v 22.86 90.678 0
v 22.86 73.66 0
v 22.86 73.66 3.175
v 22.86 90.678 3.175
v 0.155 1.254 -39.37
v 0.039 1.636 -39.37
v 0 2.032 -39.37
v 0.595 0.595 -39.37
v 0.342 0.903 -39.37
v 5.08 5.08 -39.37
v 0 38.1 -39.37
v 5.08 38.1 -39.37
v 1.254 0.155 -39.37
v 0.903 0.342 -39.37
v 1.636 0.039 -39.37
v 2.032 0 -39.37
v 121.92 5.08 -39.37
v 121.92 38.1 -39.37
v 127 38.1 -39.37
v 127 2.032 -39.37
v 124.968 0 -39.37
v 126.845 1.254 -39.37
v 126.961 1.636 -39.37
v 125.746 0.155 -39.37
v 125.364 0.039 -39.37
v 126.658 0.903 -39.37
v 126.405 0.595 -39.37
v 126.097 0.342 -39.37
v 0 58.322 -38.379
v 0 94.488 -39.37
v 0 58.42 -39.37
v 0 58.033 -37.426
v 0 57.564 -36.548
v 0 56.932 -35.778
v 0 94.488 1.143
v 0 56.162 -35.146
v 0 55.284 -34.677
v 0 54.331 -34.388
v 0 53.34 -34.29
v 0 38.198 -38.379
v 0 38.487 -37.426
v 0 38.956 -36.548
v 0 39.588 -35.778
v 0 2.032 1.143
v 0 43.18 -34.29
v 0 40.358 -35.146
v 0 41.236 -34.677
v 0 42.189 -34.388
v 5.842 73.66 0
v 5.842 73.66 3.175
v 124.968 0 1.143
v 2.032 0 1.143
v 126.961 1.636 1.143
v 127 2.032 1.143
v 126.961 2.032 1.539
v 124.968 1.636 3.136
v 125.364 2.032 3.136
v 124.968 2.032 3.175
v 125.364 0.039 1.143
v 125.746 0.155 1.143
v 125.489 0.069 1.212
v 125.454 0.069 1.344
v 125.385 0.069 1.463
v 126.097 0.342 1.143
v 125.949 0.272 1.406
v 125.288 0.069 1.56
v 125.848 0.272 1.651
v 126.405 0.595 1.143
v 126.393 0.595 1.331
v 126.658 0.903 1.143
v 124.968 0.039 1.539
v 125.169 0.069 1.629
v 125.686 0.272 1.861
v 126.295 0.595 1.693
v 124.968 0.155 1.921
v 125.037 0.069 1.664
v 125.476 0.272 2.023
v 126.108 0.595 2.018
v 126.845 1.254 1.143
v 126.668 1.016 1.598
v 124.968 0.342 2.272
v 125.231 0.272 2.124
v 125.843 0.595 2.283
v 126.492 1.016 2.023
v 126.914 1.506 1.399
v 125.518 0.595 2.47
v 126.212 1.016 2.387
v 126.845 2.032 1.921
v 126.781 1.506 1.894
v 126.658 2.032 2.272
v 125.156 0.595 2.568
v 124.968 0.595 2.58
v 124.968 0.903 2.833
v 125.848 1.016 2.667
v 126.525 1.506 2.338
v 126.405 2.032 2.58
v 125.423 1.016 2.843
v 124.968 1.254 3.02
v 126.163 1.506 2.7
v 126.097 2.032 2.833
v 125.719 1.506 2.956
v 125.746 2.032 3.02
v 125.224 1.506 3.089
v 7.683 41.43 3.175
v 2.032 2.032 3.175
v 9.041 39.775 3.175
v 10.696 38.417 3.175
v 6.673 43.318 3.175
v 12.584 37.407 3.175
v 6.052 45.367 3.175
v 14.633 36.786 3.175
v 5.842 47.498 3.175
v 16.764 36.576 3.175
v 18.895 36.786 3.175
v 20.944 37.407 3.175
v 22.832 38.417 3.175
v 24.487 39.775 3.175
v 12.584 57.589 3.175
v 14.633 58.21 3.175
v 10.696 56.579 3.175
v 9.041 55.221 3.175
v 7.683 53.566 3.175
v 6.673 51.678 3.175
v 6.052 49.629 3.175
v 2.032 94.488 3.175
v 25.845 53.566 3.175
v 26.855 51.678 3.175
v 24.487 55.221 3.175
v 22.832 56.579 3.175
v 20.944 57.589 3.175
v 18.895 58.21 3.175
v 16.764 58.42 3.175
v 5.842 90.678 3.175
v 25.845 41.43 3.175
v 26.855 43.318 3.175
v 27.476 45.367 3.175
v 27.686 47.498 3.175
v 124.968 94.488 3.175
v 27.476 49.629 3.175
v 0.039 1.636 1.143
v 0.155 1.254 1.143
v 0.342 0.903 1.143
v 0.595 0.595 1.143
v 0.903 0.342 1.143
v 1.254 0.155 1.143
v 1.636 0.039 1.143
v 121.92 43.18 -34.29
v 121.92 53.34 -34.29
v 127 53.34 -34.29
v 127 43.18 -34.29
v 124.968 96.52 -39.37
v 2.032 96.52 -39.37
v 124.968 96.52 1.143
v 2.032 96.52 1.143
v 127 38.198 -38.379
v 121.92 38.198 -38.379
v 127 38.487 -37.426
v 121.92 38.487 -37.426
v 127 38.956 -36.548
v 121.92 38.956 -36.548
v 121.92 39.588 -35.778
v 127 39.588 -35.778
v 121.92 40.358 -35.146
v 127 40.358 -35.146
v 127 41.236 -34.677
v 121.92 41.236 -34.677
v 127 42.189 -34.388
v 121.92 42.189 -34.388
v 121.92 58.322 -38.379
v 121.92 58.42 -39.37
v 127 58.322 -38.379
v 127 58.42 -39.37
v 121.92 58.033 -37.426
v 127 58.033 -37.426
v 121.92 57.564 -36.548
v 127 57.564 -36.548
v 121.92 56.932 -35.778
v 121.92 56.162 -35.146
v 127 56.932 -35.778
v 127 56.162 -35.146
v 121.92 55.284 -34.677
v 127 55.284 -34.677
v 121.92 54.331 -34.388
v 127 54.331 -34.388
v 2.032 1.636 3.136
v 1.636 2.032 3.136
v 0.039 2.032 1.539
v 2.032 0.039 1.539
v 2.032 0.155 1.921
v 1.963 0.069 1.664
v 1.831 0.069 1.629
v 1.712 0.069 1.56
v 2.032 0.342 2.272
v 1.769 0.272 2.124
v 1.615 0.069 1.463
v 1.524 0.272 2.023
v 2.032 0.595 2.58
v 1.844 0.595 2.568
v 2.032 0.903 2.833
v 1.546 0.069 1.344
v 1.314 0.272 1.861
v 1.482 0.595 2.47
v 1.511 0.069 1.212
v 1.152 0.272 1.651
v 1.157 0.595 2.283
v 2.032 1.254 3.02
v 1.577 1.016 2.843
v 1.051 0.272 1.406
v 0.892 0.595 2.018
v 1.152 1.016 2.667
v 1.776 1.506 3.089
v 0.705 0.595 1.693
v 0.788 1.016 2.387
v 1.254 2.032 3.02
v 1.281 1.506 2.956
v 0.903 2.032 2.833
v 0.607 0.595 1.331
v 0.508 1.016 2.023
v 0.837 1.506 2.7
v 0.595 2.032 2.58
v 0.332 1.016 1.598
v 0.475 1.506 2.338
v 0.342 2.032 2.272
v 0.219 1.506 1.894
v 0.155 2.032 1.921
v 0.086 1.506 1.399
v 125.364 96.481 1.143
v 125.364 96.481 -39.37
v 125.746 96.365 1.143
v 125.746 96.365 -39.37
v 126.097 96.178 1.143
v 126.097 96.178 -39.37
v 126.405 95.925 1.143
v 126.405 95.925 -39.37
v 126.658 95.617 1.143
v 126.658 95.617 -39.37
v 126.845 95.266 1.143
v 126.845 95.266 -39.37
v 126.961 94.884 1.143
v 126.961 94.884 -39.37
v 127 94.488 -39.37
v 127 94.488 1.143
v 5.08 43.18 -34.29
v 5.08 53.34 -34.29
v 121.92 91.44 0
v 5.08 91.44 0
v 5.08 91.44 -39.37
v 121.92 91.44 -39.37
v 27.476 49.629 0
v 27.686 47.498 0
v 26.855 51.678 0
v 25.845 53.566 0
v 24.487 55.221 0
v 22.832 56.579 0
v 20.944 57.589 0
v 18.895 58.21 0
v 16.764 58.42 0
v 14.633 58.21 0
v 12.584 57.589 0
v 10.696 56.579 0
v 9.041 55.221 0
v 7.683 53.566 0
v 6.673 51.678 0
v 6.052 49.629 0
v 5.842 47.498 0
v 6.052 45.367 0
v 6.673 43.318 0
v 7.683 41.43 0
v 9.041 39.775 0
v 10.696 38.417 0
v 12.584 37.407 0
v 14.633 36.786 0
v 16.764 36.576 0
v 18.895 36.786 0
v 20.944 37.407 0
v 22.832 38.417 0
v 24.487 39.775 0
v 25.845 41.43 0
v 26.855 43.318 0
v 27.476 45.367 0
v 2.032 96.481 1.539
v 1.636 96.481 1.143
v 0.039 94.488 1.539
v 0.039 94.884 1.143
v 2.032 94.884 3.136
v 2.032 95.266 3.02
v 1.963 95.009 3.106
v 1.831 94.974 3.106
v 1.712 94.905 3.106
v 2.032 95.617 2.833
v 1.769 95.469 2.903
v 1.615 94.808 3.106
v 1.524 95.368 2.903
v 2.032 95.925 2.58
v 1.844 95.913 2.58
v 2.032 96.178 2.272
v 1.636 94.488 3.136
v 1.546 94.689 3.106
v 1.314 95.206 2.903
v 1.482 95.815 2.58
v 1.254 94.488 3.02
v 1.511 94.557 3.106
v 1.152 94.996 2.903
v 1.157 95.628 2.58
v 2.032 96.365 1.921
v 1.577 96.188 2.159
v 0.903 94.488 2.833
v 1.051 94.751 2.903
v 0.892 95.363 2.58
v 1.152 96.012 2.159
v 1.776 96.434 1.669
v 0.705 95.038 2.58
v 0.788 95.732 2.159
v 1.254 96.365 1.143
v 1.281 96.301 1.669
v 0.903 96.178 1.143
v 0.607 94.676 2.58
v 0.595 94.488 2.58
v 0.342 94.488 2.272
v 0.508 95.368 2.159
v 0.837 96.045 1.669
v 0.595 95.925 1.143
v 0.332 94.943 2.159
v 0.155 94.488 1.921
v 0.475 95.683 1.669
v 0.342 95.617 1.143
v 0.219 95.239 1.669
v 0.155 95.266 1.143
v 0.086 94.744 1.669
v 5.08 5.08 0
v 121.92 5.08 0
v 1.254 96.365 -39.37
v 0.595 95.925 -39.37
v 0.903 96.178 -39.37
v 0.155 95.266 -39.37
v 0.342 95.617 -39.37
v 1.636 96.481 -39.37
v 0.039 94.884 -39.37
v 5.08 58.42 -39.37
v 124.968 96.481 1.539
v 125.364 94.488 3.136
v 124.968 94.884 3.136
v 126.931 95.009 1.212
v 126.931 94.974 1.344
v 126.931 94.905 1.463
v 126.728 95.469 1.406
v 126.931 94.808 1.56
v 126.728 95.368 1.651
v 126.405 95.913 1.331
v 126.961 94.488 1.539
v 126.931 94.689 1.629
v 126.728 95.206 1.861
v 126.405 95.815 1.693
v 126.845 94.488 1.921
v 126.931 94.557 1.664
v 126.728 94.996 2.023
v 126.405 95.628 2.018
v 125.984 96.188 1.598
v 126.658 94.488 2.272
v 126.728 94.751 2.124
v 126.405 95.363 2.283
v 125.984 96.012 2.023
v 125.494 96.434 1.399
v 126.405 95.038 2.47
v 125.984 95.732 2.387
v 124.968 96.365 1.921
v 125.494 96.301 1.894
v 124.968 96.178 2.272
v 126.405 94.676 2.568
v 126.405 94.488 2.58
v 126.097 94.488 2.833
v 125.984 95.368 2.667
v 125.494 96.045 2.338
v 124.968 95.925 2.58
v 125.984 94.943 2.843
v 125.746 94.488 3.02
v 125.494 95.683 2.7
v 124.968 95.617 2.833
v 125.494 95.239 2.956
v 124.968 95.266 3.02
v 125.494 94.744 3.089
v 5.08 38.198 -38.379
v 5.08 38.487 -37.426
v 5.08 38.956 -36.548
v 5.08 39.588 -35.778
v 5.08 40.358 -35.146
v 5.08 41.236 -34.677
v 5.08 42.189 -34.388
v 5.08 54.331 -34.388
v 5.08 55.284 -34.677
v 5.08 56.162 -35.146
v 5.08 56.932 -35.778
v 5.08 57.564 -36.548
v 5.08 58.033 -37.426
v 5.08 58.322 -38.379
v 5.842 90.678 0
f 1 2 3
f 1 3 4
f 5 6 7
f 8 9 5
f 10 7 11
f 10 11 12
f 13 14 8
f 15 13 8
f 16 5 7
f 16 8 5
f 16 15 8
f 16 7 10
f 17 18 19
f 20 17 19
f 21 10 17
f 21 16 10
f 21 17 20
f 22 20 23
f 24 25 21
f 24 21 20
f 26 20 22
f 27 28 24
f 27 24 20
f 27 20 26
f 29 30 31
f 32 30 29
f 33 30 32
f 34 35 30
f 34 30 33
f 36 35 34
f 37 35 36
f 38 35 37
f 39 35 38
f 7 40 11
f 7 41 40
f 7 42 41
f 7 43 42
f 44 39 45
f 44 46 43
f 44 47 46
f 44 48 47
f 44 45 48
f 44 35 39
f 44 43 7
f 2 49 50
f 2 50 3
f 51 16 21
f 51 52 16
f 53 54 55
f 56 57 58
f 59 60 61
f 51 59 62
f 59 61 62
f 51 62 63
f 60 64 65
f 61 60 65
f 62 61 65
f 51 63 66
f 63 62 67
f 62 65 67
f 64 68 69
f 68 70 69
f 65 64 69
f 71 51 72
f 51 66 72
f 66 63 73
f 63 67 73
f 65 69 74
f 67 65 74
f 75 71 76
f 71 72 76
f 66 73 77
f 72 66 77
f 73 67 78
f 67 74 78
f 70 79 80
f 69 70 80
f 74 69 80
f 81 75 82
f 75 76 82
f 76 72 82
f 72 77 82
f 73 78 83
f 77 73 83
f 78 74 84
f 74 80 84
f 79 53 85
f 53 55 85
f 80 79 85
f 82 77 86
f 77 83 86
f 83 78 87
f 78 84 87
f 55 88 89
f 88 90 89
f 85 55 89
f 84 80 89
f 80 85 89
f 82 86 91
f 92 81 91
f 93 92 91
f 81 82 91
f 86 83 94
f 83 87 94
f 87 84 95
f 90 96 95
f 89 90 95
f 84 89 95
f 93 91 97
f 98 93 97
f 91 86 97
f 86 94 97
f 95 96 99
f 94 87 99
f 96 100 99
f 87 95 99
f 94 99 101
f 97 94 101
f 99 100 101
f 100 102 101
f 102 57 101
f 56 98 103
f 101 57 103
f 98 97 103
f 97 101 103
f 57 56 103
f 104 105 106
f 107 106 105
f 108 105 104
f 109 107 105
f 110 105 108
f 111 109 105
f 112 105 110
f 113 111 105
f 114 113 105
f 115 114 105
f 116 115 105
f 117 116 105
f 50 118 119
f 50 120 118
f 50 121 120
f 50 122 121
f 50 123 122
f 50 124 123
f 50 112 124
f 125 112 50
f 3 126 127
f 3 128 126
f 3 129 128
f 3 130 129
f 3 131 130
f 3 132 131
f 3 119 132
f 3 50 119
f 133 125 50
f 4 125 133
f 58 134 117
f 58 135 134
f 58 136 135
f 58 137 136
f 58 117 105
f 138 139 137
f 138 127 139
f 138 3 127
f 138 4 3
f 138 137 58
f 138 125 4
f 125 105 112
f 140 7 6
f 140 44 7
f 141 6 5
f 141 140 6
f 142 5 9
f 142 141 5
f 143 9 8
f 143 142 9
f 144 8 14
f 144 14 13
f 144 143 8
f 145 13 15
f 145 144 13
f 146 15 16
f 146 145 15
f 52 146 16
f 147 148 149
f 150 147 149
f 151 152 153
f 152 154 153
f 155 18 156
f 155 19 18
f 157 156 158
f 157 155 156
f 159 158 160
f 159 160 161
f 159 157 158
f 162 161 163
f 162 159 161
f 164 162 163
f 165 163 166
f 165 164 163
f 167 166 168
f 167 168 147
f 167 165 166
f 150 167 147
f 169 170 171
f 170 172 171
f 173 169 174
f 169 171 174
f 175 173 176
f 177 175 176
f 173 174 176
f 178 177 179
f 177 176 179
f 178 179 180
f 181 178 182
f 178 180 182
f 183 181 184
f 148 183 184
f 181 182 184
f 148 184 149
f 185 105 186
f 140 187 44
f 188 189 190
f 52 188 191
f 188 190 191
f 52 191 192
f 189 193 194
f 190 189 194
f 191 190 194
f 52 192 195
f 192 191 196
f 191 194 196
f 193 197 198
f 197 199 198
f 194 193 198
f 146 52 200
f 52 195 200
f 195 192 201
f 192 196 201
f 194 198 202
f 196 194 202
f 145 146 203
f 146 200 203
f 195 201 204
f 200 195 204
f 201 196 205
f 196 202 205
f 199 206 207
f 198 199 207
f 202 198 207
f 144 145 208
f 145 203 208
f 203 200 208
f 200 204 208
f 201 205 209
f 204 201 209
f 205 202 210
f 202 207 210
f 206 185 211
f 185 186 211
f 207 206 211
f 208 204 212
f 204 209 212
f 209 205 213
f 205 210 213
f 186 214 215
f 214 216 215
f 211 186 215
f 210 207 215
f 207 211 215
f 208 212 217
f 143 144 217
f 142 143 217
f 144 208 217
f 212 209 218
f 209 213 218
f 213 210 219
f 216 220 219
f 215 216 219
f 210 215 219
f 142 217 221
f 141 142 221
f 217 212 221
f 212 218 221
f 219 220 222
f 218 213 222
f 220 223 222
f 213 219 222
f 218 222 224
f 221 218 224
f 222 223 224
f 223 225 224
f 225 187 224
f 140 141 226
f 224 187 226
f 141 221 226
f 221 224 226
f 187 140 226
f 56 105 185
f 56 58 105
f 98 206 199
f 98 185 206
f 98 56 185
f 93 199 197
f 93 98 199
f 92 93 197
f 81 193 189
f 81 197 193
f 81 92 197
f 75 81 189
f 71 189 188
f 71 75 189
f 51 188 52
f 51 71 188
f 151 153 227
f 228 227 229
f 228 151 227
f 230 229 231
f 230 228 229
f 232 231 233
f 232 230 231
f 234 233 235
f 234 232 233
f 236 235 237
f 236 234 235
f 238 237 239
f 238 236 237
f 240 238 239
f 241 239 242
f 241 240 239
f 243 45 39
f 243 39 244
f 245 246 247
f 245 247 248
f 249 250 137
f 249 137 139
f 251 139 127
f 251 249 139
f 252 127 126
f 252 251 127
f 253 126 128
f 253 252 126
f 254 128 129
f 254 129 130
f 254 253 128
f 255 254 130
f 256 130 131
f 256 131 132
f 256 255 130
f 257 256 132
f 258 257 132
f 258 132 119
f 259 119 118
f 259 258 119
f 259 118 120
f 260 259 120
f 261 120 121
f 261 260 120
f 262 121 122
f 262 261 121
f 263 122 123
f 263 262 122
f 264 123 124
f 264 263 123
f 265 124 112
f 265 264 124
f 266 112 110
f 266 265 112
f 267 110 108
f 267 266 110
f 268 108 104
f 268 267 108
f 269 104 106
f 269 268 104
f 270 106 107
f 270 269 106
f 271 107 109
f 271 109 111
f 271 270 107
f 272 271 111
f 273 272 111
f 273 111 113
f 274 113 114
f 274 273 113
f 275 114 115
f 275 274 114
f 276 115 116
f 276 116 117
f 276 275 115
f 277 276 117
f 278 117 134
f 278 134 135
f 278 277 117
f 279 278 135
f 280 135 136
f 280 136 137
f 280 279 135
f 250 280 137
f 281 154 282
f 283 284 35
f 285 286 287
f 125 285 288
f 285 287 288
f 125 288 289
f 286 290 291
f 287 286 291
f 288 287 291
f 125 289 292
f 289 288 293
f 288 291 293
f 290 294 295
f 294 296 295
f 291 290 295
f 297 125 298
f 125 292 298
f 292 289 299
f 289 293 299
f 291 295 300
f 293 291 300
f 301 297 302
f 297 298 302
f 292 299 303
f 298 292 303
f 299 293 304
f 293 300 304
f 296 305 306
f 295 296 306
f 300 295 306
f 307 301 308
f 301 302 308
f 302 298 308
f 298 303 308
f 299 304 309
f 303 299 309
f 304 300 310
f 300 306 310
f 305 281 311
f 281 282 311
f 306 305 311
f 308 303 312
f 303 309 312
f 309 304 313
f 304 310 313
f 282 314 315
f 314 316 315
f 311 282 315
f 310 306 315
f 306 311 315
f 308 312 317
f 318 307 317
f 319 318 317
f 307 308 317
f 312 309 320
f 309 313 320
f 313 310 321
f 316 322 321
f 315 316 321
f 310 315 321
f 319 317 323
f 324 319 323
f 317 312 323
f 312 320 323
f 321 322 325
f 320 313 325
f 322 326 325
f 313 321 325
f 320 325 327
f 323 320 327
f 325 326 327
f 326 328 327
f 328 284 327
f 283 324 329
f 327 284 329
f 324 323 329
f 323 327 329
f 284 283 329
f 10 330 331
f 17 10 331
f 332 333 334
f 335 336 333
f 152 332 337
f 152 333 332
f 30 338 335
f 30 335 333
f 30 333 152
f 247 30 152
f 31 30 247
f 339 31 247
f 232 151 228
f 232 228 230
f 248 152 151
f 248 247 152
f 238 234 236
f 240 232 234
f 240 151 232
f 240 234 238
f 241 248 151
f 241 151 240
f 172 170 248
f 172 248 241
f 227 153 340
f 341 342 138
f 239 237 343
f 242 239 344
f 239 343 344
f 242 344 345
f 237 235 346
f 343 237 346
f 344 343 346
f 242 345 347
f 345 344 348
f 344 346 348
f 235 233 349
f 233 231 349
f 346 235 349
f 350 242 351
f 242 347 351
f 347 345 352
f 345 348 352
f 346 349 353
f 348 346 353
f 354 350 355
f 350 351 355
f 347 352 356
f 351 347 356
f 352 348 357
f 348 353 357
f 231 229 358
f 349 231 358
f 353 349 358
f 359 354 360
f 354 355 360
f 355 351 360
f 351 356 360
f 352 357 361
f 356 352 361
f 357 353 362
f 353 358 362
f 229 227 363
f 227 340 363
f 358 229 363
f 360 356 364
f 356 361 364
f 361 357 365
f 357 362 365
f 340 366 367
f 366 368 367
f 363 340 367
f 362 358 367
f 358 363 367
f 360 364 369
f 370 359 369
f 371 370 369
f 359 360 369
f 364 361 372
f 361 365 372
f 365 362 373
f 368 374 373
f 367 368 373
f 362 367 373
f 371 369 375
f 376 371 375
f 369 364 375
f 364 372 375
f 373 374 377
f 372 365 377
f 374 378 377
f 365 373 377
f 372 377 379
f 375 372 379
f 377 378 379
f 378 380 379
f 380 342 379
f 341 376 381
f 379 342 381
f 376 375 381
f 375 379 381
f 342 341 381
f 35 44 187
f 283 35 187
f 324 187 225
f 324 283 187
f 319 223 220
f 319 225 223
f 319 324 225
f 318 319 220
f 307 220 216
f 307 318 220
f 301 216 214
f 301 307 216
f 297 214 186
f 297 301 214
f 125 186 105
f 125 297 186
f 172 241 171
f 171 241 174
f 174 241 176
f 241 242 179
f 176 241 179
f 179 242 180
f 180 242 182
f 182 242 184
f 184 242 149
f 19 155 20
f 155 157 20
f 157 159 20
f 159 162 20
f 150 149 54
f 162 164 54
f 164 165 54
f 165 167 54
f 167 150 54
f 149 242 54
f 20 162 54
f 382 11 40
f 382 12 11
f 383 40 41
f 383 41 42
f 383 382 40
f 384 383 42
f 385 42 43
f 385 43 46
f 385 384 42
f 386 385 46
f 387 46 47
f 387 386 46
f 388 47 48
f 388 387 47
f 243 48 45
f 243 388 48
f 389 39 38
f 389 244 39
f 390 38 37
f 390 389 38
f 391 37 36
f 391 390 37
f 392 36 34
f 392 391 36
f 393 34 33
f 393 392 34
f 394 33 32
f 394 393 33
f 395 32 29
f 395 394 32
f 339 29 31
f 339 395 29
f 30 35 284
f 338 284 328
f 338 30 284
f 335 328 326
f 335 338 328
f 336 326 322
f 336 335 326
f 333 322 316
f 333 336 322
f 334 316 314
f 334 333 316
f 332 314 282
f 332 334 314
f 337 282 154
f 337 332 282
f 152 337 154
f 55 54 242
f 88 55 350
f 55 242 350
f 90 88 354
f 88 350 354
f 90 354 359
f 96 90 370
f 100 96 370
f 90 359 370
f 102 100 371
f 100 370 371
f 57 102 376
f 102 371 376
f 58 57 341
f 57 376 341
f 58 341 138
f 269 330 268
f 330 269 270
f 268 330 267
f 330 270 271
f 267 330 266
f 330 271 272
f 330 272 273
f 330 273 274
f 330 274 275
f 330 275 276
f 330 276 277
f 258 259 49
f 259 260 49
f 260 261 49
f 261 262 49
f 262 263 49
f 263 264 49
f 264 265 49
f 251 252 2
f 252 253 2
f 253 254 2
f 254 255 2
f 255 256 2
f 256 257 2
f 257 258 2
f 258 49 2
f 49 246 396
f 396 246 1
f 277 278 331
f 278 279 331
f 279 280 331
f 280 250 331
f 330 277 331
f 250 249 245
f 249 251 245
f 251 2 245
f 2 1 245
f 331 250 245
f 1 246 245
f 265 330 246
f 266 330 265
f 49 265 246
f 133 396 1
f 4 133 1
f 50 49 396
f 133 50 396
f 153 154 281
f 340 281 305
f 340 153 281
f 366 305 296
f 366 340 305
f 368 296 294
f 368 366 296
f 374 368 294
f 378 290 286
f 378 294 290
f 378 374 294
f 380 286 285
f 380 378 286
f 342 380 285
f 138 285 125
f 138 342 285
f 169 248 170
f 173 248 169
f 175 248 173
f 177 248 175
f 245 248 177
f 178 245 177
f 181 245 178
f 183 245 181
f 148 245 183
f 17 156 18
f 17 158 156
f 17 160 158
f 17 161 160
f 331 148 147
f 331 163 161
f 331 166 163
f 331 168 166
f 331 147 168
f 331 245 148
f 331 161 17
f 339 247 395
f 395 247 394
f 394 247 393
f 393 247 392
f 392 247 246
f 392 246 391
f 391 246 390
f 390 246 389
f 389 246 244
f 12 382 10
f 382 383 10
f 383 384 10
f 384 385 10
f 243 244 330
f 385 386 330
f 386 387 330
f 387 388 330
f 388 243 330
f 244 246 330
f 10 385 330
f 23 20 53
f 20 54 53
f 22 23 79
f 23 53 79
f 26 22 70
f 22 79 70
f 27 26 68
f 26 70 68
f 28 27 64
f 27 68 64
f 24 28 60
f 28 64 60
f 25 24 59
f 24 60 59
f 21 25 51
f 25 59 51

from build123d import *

# Parameters (mm, degrees)
F0_W     = 127
F0_H     = 96.52
F0_R     = 10.922
F0_W_2   = 17.018
F0_H_2   = 17.018
F1_DEPTH = 3.175
F2_W     = 127
F2_H     = 96.52
F2_W_2   = 116.8399999365
F2_H_2   = 86.3599999365
F3_DEPTH = 39.37
F4_R     = 2.032
F5_W     = 5.0800000317
F5_H     = 20.32
F6_DEPTH = 5.08
F7_R     = 5.07999


# Not quite as in the source:
# - a fillet or chamfer is up to 0.001 mm smaller than in the source, because OpenCascade refuses the exact size


with BuildPart() as f1:
    # F0 (on Top) → F1 (new body)
    with BuildSketch(Plane.XY):
        with Locations((63.5, 48.26)):
            Rectangle(F0_W, F0_H)
        with Locations((16.764, 47.498)):
            Circle(F0_R, mode=Mode.SUBTRACT)
        with Locations((14.351, 82.169)):
            Rectangle(F0_W_2, F0_H_2, mode=Mode.SUBTRACT)
    extrude(amount=F1_DEPTH)

    # F2 (on face) → F3 (join)
    with BuildSketch(Plane(origin=(0, 0, 0), x_dir=(1, 0, 0), z_dir=(0, 0, -1))):
        with Locations((63.5, -48.26)):
            Rectangle(F2_W, F2_H)
        with Locations((63.5, -48.26)):
            Rectangle(F2_W_2, F2_H_2, mode=Mode.SUBTRACT)
    extrude(amount=F3_DEPTH)

    # F4
    f4_edges = [f1.edges().sort_by_distance(p)[0] for p in [
        (0, 96.52, -18.0975),
        (63.5, 96.52, 3.175),
        (0, 48.26, 3.175),
        (127, 96.52, -18.0975),
        (127, 48.26, 3.175),
        (127, 0, -18.0975),
        (63.5, 0, 3.175),
        (0, 0, -18.0975),
    ]]
    fillet(f4_edges, radius=F4_R)

    # F5 (on face) → F6 (cut)
    with BuildSketch(Plane(origin=(0, 0, -39.37), x_dir=(1, 0, 0), z_dir=(0, 0, -1))):
        with Locations((124.4599999841, -48.26)):
            Rectangle(F5_W, F5_H)
        with Locations((2.5400000159, -48.26)):
            Rectangle(F5_W, F5_H)
    extrude(amount=-F6_DEPTH, mode=Mode.SUBTRACT)

    # F7 (radius 5.08 in the source; OpenCascade refuses exactly that, so slightly less here)
    f7_edges = [f1.edges().sort_by_distance(p)[0] for p in [
        (2.54, 38.1, -34.29),
        (2.54, 58.42, -34.29),
        (124.46, 58.42, -34.29),
        (124.46, 38.1, -34.29),
    ]]
    fillet(f7_edges, radius=F7_R)


solid = f1.part
